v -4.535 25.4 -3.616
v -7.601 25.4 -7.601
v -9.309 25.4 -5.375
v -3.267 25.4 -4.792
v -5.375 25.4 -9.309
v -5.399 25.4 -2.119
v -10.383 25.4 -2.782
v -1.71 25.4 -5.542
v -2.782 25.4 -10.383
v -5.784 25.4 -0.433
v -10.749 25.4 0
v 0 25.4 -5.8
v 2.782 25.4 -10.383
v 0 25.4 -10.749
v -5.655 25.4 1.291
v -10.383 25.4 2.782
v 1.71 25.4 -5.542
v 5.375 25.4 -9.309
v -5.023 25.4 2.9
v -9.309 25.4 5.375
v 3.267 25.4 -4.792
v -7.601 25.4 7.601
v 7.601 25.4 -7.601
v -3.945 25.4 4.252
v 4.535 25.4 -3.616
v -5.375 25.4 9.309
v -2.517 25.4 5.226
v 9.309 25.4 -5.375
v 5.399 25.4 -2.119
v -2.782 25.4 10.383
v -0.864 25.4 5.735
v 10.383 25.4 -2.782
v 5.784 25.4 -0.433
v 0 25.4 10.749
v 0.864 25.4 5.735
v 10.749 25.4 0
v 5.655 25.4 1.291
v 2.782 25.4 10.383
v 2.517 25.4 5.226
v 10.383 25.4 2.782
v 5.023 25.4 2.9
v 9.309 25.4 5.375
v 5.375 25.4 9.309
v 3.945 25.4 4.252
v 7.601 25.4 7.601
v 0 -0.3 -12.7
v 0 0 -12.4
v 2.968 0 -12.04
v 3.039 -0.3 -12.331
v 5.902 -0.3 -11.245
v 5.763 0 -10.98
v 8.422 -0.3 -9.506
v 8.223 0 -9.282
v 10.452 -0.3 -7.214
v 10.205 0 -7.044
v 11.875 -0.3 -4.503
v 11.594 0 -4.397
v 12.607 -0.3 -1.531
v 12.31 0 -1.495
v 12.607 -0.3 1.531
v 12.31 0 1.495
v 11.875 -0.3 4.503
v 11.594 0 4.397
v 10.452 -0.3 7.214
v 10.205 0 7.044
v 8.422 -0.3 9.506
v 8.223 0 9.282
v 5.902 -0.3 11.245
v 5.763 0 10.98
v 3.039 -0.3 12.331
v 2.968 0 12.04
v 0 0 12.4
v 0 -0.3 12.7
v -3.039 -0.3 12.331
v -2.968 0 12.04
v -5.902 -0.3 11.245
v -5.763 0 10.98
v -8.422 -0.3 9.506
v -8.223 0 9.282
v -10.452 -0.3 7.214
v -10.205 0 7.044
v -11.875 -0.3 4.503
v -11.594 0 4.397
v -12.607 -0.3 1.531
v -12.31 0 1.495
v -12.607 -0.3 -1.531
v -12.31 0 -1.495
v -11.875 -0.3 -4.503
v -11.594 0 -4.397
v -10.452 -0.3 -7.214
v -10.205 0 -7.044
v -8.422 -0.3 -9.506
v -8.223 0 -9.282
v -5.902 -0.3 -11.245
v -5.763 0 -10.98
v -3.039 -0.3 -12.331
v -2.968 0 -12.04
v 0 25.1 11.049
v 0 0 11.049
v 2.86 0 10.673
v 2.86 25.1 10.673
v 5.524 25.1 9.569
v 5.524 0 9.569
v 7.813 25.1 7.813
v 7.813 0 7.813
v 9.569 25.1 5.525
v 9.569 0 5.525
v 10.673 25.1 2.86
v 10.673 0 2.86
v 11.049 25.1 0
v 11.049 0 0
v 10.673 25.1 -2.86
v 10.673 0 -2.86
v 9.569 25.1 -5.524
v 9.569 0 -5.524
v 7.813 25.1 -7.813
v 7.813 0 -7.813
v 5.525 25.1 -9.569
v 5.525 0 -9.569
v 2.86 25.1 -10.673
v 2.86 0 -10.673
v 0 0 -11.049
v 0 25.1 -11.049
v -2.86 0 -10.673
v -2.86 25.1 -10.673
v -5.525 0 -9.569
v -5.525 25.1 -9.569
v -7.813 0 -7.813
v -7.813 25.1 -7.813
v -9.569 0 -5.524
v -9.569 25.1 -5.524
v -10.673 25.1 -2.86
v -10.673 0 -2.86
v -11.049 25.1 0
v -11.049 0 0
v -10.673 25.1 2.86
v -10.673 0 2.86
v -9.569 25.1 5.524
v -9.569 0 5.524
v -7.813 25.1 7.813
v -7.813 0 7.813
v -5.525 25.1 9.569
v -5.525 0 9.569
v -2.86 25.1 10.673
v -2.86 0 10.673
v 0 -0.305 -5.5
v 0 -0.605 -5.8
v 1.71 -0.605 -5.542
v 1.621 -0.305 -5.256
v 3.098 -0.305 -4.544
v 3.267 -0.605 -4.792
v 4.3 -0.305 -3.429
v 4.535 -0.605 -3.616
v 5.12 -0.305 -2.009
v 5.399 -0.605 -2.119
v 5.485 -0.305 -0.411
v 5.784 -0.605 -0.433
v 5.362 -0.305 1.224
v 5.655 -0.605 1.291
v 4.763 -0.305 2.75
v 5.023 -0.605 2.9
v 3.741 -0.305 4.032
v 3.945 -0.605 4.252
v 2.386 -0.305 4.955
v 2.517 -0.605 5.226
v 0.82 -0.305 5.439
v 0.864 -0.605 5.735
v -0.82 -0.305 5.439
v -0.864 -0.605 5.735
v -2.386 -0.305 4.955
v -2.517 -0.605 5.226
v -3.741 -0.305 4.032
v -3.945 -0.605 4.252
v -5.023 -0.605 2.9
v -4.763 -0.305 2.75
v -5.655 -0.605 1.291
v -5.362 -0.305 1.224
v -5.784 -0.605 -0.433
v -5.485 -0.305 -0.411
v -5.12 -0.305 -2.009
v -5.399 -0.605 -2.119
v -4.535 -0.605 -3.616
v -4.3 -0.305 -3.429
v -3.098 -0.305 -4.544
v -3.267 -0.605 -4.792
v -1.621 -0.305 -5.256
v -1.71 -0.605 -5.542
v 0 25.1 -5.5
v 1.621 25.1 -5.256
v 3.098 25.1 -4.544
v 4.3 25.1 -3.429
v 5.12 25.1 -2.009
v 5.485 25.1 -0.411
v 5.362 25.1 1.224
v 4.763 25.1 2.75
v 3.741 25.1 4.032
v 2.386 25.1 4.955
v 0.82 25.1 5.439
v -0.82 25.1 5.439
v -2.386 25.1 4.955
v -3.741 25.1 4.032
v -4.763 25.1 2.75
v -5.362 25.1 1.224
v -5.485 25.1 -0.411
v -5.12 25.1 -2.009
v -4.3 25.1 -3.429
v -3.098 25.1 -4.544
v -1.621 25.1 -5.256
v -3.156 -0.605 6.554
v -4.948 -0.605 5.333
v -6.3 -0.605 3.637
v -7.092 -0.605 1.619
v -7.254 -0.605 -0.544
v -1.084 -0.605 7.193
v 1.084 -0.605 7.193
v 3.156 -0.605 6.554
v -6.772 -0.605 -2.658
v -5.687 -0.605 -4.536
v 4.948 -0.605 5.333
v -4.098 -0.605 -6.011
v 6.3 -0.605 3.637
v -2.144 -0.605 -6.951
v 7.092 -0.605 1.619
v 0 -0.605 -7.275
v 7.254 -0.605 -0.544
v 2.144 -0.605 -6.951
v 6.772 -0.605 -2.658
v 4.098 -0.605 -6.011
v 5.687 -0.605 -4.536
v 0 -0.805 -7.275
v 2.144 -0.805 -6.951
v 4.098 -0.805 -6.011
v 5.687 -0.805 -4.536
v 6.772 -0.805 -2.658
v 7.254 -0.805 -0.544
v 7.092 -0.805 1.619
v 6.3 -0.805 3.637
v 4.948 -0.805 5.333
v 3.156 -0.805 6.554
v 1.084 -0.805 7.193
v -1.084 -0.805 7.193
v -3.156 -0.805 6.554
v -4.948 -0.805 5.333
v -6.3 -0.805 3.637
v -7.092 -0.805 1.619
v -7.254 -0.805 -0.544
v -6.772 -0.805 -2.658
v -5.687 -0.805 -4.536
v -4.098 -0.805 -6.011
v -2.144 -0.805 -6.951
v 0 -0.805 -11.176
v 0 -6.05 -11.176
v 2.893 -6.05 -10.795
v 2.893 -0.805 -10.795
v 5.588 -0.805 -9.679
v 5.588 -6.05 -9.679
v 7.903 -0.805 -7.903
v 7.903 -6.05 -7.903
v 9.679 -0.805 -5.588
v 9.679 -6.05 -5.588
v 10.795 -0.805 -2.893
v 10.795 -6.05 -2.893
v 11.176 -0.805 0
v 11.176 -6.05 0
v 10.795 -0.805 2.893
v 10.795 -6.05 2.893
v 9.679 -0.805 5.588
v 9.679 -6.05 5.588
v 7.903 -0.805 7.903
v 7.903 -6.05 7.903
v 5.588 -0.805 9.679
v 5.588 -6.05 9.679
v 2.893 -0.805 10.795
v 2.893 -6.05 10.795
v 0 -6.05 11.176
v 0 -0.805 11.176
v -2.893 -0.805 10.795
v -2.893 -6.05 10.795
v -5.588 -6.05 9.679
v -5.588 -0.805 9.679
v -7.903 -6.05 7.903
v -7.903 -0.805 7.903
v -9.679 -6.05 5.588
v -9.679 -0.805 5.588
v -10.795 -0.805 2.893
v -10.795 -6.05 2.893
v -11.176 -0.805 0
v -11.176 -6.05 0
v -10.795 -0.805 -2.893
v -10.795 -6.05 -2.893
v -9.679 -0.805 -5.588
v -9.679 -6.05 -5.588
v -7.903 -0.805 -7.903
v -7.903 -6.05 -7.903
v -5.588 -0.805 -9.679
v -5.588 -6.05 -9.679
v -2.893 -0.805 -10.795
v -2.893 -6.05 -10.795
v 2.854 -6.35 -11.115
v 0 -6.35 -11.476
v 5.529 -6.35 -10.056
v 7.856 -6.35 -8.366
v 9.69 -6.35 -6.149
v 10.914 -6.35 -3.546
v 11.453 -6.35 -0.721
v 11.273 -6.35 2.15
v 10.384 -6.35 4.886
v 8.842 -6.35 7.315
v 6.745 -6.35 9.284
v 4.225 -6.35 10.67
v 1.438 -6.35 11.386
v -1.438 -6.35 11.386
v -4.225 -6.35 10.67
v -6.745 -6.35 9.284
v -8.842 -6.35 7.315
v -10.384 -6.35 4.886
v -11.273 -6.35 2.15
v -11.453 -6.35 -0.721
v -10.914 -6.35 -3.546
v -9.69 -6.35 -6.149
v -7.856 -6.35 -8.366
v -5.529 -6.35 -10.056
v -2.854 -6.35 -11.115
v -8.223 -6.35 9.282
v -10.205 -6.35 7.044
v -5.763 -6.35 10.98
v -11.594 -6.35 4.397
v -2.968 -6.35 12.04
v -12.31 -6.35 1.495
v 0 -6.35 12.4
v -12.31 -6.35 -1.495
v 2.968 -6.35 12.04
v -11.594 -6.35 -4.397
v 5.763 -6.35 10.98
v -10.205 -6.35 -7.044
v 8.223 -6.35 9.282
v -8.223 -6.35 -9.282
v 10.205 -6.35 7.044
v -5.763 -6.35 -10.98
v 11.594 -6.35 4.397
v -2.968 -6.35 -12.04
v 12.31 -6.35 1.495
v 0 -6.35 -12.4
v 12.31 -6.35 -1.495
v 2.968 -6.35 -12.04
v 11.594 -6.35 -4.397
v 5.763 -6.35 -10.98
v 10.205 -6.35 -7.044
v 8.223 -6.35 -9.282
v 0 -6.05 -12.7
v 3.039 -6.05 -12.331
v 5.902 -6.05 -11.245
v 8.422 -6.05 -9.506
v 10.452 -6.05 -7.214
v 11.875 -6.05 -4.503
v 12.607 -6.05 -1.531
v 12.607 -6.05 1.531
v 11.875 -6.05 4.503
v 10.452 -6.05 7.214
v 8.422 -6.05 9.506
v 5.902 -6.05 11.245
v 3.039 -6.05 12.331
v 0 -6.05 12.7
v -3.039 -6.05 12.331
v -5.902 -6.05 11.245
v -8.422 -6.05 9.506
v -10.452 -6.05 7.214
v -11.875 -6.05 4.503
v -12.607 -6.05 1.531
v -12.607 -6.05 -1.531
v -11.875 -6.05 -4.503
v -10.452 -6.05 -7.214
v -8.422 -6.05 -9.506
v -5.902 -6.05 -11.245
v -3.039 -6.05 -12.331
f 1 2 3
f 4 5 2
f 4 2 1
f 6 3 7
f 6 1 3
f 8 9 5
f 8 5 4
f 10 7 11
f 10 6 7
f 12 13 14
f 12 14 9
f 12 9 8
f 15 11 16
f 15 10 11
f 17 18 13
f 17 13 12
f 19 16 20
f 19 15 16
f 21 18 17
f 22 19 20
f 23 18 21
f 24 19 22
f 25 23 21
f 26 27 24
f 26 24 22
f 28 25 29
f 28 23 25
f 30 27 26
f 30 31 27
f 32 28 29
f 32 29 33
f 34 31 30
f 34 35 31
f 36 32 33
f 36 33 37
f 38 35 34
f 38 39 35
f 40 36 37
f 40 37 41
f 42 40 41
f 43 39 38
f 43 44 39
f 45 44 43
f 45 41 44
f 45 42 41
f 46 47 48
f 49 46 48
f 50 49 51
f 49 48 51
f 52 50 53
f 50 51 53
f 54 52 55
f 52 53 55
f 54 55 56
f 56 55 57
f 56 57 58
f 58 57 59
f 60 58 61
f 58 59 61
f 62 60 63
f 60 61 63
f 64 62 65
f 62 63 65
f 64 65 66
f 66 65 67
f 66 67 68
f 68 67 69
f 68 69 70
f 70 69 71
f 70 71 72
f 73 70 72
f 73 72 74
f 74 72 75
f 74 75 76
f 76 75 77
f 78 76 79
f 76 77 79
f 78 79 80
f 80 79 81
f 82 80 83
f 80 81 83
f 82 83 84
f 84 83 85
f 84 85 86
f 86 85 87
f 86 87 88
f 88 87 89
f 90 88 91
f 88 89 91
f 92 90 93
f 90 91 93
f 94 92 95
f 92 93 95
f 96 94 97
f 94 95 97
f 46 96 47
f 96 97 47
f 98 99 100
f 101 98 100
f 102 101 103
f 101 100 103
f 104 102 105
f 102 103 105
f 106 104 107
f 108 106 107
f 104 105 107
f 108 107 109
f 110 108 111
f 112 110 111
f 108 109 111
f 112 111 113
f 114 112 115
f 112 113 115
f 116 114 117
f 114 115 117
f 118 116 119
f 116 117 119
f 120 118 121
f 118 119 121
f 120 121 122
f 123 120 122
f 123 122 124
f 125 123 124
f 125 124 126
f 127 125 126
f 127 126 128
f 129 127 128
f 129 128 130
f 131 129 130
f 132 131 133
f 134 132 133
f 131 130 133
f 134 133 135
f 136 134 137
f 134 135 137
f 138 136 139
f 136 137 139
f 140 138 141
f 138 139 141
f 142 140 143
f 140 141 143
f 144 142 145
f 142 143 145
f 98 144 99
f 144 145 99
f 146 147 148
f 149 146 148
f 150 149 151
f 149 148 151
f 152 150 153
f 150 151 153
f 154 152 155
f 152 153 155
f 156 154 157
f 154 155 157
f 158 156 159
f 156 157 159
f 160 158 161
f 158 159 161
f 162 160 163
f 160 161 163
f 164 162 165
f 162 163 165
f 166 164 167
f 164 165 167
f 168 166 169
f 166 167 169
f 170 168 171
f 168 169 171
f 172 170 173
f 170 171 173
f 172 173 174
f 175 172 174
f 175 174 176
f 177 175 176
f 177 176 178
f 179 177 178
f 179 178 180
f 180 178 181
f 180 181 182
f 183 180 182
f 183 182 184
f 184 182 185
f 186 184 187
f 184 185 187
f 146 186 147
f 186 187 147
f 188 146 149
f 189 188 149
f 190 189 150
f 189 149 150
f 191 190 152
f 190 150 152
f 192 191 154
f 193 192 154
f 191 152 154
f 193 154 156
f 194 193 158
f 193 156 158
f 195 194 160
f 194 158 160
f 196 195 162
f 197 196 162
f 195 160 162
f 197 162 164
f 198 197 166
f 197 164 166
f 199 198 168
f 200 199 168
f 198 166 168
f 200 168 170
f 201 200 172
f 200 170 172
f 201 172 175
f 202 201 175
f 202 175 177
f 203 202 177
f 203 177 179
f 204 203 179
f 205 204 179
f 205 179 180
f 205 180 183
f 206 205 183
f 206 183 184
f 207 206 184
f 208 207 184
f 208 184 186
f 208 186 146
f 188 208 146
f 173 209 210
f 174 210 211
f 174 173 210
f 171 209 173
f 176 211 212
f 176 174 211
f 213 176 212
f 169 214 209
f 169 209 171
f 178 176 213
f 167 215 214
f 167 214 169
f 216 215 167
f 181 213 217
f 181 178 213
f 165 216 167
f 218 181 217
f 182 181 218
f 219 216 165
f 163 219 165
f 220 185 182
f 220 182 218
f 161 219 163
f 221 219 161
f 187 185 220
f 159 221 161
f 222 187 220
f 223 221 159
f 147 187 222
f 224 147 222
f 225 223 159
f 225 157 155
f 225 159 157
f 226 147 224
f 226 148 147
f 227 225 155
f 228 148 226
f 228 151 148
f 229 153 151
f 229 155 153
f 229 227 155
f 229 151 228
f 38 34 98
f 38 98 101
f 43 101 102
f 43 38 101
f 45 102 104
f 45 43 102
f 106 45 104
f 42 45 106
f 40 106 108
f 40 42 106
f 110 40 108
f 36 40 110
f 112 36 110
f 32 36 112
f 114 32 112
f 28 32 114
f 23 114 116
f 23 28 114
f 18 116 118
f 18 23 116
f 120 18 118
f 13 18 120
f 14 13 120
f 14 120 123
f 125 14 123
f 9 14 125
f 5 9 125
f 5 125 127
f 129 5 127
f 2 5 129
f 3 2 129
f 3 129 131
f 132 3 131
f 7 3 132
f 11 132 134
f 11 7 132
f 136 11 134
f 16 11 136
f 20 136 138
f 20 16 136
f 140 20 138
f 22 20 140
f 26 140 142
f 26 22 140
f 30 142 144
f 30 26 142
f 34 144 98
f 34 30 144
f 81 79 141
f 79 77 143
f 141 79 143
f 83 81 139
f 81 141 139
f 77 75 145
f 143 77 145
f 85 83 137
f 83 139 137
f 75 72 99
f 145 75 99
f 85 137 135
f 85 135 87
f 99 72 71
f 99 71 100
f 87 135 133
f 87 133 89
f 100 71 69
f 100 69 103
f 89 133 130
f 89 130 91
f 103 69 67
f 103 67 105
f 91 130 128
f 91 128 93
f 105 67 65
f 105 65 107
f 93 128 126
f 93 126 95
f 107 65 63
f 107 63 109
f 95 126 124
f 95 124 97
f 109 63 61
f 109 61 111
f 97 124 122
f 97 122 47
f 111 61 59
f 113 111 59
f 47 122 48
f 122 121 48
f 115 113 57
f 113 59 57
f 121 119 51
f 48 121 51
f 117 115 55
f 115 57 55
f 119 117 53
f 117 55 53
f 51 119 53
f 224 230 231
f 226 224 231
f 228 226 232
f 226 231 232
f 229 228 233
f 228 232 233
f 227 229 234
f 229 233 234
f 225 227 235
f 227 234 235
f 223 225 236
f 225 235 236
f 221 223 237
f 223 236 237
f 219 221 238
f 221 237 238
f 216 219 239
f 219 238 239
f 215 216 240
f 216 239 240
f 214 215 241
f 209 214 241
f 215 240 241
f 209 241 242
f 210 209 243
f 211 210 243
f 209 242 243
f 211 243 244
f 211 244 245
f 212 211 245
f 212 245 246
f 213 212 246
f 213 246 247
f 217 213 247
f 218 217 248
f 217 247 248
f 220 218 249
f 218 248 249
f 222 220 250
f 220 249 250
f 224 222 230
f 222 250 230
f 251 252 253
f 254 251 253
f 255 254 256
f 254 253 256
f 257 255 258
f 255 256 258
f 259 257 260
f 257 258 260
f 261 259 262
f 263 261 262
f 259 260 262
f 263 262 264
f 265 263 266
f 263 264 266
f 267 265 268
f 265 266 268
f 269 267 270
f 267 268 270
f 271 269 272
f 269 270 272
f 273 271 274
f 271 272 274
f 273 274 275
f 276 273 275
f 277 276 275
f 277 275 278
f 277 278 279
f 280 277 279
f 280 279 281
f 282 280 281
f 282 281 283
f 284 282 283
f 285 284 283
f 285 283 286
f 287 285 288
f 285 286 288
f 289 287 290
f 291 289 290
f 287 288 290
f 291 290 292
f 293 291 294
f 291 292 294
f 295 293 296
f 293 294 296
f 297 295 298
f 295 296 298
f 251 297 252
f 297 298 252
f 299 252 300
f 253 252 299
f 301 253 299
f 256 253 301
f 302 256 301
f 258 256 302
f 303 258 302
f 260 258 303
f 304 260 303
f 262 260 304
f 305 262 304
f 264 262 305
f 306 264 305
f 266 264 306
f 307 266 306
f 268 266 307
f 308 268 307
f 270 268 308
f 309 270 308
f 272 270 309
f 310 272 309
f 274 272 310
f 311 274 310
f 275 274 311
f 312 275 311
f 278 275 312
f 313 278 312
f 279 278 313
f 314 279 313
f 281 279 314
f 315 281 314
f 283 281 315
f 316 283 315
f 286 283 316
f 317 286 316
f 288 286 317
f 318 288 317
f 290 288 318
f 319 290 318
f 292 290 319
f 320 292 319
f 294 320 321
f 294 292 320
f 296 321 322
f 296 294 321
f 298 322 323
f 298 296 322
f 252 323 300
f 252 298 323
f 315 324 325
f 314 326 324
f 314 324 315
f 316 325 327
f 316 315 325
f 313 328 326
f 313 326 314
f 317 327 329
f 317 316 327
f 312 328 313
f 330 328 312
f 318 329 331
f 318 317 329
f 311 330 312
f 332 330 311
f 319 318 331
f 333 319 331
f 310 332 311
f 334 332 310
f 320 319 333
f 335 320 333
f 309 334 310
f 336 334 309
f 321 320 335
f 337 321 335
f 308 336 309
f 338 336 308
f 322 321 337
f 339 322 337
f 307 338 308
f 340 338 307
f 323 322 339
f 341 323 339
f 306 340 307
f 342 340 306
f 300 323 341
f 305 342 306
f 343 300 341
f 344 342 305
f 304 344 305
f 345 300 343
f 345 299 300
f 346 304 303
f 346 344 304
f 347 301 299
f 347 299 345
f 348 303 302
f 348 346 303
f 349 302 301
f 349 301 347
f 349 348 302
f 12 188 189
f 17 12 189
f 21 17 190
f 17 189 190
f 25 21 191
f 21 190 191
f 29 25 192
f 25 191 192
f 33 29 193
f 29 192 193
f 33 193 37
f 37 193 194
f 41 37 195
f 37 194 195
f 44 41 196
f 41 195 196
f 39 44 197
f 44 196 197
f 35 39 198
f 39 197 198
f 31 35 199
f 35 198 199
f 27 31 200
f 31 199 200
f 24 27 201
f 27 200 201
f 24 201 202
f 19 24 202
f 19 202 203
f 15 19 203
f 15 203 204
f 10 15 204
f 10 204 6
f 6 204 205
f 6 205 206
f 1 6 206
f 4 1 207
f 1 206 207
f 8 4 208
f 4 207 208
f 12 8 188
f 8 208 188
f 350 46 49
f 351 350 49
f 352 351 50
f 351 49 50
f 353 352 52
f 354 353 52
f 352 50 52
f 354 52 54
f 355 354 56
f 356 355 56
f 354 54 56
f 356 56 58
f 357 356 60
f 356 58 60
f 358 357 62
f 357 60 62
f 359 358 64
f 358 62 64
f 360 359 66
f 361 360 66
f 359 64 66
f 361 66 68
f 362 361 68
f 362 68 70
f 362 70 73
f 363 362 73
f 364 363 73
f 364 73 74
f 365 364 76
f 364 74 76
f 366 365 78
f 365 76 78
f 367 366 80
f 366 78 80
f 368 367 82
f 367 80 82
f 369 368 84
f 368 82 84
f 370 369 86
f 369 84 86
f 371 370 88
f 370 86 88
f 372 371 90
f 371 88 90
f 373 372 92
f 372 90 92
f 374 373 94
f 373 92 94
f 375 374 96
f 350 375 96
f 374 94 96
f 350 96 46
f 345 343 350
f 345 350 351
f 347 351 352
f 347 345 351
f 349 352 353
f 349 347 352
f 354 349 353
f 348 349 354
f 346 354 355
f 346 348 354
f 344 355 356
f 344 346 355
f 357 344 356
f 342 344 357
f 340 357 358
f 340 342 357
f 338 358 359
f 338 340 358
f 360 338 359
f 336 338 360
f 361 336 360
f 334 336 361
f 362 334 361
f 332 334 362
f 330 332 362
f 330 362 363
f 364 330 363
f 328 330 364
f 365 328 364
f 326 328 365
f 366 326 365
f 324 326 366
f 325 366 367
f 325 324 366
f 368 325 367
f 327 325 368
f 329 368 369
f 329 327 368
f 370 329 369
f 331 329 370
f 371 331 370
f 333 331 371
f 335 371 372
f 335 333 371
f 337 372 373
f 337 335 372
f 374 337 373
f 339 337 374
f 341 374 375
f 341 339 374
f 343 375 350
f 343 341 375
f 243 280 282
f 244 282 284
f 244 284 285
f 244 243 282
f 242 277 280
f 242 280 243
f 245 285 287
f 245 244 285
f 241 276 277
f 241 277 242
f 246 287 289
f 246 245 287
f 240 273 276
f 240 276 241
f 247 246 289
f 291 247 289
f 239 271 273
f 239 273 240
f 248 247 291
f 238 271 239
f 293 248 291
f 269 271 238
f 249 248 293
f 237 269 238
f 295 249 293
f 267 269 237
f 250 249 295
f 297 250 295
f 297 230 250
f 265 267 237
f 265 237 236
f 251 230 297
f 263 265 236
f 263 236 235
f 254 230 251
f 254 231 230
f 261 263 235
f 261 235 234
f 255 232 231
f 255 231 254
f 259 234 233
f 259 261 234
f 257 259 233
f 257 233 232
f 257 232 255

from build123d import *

# Parameters (mm, degrees)
SKETCH1_R           = 11.049
BOSS_EXTRUDE1_DEPTH = 25.4
SKETCH2_R           = 12.7
BOSS_EXTRUDE2_DEPTH = 6.35
SKETCH5_R           = 11.176
CUT_EXTRUDE2_DEPTH  = 5.545328
SKETCH6_R           = 7.27456
CUT_EXTRUDE3_DEPTH  = 0.1999996
SKETCH3_R           = 5.500000049
CUT_EXTRUDE1_DEPTH  = 37.477972806
CHAMFER1_SIZE       = 0.299999908


with BuildPart() as part:
    # Sketch1 → Boss-Extrude1 (new body)
    with BuildSketch(Plane(origin=(0, 0, 0), x_dir=(1, 0, 0), z_dir=(0, 1, 0))):
        with Locations(Location((0, 0, 0), (0, 0, 270))):
            Circle(SKETCH1_R)
    extrude(amount=BOSS_EXTRUDE1_DEPTH)

    # Sketch2 → Boss-Extrude2 (add)
    with BuildSketch(Plane.XZ):
        with Locations(Location((0, 0, 0), (0, 0, 270))):
            Circle(SKETCH2_R)
    extrude(amount=BOSS_EXTRUDE2_DEPTH)

    # Sketch5 → Cut-Extrude2 (cut)
    with BuildSketch(Plane.XZ.offset(6.35)):
        with Locations(Location((0, 0, 0), (0, 0, 270))):
            Circle(SKETCH5_R)
    extrude(amount=-CUT_EXTRUDE2_DEPTH, mode=Mode.SUBTRACT)

    # Sketch6 → Cut-Extrude3 (cut)
    with BuildSketch(Plane.XZ.offset(0.804672)):
        with Locations(Location((0, 0, 0), (0, 0, 270))):
            Circle(SKETCH6_R)
    extrude(amount=-CUT_EXTRUDE3_DEPTH, mode=Mode.SUBTRACT)

    # Sketch3 → Cut-Extrude1 (cut, through all)
    with BuildSketch(Plane.XZ.offset(6.35)):
        with Locations(Location((0, 0, 0), (0, 0, 270))):
            Circle(SKETCH3_R)
    extrude(amount=-CUT_EXTRUDE1_DEPTH, mode=Mode.SUBTRACT)

    # Chamfer1
    chamfer1_edges = [part.edges().sort_by_distance(p)[0] for p in [
        (0, -6.35, 11.176),
        (0, -0.6046724, 5.500000049),
        (0, 25.4, 5.500000049),
        (0, 25.4, -11.049),
        (0, 0, 12.7),
        (0, -6.35, 12.7),
    ]]
    chamfer(chamfer1_edges, length=CHAMFER1_SIZE)


solid = part.part
